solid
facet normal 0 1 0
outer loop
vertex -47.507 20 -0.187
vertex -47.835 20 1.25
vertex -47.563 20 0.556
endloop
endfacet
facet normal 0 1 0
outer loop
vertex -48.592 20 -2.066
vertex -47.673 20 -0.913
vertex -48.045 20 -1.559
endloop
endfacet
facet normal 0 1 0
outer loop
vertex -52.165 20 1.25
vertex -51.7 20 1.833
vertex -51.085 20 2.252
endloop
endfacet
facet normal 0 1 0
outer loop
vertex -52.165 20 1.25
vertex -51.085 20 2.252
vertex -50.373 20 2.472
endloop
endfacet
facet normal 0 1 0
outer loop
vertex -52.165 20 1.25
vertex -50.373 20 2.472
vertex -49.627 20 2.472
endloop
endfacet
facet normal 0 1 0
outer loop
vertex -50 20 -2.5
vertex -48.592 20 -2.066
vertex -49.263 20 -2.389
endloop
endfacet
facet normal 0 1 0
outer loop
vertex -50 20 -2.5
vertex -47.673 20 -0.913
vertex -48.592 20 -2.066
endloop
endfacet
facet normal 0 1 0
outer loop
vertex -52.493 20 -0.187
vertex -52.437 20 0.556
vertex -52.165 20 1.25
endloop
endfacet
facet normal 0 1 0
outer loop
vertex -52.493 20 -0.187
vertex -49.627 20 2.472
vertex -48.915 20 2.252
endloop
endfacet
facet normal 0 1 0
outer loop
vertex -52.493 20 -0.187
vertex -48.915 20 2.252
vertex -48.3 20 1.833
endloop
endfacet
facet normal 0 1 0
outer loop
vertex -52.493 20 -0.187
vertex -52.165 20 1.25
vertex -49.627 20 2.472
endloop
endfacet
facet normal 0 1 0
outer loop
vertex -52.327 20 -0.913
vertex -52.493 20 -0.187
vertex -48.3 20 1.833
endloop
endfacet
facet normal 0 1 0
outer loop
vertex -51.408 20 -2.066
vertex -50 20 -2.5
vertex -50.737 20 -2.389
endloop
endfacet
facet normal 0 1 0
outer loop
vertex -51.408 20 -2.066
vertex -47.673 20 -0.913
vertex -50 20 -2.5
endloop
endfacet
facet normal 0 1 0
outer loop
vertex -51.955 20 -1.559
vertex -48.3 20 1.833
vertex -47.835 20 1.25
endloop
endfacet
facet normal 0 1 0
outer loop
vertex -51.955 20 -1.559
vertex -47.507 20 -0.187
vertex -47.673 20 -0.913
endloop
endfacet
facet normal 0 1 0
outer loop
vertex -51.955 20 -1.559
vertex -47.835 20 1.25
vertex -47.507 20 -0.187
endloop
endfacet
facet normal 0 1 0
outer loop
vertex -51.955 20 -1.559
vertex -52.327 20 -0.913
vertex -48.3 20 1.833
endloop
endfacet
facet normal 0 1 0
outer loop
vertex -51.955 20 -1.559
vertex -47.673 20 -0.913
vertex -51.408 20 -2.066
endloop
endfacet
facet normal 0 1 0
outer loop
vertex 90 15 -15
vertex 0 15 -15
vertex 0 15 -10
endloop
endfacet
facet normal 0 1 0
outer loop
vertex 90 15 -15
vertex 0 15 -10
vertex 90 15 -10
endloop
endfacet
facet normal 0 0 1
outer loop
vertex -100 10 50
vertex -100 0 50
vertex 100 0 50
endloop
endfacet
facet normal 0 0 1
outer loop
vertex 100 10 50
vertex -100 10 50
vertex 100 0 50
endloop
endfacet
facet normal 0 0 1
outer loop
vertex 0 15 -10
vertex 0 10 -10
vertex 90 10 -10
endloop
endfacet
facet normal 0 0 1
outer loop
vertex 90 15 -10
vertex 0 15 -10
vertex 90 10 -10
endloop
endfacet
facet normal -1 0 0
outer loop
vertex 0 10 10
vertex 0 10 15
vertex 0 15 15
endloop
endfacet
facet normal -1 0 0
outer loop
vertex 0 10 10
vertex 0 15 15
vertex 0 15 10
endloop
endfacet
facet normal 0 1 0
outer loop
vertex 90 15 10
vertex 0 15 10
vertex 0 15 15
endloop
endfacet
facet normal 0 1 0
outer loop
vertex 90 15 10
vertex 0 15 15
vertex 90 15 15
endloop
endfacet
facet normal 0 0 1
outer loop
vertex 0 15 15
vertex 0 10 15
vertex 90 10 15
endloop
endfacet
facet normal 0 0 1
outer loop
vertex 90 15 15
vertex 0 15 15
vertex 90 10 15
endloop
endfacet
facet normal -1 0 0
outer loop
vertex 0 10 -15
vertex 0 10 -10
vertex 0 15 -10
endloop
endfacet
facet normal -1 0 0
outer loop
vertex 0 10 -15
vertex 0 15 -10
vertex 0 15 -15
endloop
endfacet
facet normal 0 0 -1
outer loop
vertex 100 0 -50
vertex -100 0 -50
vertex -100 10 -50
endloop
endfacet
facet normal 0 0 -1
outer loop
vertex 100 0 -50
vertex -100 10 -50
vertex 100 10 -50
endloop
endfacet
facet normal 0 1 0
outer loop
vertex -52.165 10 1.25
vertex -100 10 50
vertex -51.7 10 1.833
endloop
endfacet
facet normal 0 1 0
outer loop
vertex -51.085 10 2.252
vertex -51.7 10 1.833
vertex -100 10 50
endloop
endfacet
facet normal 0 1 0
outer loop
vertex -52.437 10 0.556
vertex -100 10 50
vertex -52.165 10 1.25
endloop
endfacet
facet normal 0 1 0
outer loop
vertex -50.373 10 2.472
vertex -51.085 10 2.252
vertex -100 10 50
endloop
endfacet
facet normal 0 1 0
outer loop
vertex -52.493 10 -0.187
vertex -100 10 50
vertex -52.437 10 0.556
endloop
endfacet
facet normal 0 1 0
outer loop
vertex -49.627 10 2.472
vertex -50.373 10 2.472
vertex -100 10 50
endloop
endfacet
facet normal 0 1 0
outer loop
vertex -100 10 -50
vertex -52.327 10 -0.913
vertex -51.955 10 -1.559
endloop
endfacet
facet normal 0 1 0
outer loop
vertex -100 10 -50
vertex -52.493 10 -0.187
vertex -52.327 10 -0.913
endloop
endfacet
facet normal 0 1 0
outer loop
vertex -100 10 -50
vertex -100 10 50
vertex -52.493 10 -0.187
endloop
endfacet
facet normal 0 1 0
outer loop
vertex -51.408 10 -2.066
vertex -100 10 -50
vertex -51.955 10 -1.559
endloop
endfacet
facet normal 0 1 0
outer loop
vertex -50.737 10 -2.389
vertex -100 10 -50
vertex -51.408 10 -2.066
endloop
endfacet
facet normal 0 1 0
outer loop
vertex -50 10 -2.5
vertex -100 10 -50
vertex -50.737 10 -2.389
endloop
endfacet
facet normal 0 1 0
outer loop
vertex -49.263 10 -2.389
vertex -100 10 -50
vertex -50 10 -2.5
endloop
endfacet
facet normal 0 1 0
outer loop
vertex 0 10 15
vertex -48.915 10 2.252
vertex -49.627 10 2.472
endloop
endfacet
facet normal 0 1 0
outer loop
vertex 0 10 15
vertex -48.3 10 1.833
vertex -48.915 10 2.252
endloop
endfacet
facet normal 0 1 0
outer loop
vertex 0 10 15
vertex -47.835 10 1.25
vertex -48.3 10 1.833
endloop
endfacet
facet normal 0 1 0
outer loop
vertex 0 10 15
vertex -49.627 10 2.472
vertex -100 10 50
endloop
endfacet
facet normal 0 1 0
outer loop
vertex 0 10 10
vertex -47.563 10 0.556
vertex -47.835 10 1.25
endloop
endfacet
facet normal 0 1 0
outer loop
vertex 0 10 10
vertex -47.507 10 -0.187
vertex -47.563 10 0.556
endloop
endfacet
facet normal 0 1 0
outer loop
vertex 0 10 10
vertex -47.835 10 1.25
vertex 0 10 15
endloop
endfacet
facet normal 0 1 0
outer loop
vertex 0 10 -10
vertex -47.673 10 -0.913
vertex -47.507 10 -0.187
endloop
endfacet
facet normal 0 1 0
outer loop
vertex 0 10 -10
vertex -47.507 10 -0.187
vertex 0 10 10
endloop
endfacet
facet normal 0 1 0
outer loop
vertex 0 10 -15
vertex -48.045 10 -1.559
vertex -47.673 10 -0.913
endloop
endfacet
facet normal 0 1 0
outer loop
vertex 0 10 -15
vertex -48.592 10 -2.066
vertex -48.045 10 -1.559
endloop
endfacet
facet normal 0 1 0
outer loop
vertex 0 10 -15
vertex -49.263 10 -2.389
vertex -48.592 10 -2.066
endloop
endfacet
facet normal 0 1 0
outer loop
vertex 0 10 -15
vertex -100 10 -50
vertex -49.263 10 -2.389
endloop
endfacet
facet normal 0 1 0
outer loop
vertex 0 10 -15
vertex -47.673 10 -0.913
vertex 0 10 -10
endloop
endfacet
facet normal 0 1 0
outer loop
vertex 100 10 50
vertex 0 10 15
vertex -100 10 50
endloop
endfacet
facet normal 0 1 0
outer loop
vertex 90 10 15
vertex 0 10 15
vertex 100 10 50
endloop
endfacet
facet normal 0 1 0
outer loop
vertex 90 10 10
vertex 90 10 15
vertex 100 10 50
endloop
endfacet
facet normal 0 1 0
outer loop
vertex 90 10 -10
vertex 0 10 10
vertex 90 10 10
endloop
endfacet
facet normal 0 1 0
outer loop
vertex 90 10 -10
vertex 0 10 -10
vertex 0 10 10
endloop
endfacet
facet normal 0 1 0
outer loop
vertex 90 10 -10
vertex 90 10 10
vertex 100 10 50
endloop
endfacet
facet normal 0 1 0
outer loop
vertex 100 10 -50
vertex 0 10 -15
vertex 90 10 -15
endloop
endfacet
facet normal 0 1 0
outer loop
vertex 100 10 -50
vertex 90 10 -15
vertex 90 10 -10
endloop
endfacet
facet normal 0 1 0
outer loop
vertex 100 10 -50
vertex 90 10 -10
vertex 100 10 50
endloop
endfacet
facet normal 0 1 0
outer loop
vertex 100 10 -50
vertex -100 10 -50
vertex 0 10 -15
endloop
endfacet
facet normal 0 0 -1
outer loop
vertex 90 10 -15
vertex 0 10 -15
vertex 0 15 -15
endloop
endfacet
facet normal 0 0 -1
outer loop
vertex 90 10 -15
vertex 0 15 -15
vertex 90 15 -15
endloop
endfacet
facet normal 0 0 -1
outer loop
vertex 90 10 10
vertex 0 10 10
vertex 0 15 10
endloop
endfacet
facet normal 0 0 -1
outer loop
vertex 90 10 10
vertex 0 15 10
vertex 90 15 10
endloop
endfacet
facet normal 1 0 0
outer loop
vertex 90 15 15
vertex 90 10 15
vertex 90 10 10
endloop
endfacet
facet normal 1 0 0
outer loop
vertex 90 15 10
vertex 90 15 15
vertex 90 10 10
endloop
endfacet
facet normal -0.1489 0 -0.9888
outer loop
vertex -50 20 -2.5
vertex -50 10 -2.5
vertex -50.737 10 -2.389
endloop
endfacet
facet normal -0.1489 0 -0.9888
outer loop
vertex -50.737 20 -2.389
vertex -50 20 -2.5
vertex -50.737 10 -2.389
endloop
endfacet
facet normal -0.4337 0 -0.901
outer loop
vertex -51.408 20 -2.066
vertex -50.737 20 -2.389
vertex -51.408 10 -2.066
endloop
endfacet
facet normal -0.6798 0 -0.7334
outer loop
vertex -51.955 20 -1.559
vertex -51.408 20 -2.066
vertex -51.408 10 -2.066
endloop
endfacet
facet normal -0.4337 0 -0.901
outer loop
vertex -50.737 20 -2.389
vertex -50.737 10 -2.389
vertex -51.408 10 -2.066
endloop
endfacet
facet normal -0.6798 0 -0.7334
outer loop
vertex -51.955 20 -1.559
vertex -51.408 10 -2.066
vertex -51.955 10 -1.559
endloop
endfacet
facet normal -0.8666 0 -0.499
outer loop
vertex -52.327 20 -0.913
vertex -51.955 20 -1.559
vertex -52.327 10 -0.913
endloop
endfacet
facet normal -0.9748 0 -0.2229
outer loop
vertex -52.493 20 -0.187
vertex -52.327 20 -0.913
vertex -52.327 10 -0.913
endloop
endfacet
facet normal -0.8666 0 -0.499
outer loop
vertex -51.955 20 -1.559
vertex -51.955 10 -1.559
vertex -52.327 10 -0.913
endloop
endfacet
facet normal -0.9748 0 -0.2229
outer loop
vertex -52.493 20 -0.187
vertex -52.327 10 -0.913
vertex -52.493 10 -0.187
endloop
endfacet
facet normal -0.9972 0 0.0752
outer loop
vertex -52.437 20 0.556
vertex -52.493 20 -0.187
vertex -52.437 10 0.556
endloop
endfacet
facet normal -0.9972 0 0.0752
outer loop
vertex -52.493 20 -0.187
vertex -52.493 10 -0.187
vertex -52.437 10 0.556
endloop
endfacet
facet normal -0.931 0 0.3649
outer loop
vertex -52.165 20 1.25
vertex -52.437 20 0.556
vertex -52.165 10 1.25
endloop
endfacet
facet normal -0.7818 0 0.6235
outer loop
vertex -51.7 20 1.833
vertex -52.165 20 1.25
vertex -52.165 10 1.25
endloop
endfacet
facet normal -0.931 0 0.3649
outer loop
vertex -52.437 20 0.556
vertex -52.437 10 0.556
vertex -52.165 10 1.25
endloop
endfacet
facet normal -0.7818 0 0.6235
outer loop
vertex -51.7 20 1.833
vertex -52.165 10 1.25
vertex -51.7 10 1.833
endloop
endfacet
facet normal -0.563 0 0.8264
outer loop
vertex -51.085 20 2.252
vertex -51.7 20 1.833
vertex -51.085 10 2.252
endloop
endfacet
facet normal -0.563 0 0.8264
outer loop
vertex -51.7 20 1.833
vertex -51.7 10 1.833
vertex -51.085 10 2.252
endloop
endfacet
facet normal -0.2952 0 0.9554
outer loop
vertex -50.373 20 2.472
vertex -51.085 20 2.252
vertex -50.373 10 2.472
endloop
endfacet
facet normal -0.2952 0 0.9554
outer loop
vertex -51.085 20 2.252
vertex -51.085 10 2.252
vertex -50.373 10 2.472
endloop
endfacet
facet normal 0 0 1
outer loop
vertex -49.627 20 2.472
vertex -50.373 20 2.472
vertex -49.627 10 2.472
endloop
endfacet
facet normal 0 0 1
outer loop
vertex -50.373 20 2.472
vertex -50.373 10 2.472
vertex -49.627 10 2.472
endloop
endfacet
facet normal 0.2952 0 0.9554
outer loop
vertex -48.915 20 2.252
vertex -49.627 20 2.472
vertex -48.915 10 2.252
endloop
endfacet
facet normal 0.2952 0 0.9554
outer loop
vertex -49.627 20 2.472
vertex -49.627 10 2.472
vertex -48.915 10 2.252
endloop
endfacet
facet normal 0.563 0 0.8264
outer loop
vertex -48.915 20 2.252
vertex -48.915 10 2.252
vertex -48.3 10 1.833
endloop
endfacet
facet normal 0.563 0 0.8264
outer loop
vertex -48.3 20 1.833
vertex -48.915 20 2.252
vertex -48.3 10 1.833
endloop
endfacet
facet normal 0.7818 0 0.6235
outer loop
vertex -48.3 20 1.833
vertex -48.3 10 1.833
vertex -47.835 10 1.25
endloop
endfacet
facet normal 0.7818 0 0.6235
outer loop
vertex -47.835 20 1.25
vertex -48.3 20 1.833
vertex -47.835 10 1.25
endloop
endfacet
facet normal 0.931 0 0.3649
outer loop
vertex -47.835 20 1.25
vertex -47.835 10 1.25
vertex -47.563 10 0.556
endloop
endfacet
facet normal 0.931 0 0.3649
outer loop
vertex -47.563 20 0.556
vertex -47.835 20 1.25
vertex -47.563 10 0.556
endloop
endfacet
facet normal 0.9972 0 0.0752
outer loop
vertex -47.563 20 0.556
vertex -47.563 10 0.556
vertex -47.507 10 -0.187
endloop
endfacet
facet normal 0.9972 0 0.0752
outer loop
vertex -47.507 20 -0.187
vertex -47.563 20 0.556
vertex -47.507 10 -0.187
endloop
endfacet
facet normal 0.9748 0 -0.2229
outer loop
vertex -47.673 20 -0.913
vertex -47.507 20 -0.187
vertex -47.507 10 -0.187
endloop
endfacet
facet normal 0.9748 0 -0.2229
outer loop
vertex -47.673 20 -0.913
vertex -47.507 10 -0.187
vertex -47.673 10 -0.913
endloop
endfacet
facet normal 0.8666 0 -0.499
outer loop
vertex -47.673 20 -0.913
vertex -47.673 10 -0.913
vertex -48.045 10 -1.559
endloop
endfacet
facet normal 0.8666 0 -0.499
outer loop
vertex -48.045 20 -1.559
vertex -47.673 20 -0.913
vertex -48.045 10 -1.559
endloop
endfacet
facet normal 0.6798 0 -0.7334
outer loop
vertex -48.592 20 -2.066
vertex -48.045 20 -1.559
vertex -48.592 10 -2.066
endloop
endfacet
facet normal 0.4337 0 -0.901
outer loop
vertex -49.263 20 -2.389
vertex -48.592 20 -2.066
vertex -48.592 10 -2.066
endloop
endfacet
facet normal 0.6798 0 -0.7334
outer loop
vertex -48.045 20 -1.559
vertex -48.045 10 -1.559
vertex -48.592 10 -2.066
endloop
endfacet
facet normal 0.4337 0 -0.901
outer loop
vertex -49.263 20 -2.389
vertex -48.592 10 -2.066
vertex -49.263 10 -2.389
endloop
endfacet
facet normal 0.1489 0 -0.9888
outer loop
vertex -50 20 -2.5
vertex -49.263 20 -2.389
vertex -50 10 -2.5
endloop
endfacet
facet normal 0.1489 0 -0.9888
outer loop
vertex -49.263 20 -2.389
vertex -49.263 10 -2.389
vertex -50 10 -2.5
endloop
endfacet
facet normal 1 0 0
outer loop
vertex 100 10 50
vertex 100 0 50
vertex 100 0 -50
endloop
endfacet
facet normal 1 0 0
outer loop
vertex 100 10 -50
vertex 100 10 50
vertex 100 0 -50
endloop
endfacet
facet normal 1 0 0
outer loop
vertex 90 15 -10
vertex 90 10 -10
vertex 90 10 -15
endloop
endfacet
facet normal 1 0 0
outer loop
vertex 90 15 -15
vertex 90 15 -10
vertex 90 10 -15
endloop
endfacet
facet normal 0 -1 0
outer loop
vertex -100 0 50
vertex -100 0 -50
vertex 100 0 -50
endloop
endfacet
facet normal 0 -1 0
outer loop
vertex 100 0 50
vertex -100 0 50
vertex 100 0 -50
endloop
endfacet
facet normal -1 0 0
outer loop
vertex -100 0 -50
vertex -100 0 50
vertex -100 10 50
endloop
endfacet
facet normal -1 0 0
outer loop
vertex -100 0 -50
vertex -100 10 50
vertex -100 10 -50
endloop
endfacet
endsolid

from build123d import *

# Parameters (mm, degrees)
SKETCH1_W           = 200
SKETCH1_H           = 100
BOSS_EXTRUDE1_DEPTH = 10
SKETCH2_W           = 90
SKETCH2_H           = 5
BOSS_EXTRUDE2_DEPTH = 5
SKETCH2_3_R         = 2.5
BOSS_EXTRUDE3_DEPTH = 10


with BuildPart() as part:
    # Sketch1 → Boss-Extrude1 (new body)
    with BuildSketch(Plane(origin=(0, 0, 0), x_dir=(1, 0, 0), z_dir=(0, 1, 0))):
        Rectangle(SKETCH1_W, SKETCH1_H)
    extrude(amount=BOSS_EXTRUDE1_DEPTH)

    # Sketch2 → Boss-Extrude2 (add)
    with BuildSketch(Plane(origin=(0, 10, 0), x_dir=(1, 0, 0), z_dir=(0, 1, 0))):
        with Locations((45, 12.5)):
            Rectangle(SKETCH2_W, SKETCH2_H)
        with Locations((45, -12.5)):
            Rectangle(SKETCH2_W, SKETCH2_H)
    extrude(amount=BOSS_EXTRUDE2_DEPTH)

    # Sketch2<3> → Boss-Extrude3 (add)
    with BuildSketch(Plane(origin=(0, 10, 0), x_dir=(1, 0, 0), z_dir=(0, 1, 0))):
        with Locations((-50, 0)):
            Circle(SKETCH2_3_R)
    extrude(amount=BOSS_EXTRUDE3_DEPTH)


solid = part.part
